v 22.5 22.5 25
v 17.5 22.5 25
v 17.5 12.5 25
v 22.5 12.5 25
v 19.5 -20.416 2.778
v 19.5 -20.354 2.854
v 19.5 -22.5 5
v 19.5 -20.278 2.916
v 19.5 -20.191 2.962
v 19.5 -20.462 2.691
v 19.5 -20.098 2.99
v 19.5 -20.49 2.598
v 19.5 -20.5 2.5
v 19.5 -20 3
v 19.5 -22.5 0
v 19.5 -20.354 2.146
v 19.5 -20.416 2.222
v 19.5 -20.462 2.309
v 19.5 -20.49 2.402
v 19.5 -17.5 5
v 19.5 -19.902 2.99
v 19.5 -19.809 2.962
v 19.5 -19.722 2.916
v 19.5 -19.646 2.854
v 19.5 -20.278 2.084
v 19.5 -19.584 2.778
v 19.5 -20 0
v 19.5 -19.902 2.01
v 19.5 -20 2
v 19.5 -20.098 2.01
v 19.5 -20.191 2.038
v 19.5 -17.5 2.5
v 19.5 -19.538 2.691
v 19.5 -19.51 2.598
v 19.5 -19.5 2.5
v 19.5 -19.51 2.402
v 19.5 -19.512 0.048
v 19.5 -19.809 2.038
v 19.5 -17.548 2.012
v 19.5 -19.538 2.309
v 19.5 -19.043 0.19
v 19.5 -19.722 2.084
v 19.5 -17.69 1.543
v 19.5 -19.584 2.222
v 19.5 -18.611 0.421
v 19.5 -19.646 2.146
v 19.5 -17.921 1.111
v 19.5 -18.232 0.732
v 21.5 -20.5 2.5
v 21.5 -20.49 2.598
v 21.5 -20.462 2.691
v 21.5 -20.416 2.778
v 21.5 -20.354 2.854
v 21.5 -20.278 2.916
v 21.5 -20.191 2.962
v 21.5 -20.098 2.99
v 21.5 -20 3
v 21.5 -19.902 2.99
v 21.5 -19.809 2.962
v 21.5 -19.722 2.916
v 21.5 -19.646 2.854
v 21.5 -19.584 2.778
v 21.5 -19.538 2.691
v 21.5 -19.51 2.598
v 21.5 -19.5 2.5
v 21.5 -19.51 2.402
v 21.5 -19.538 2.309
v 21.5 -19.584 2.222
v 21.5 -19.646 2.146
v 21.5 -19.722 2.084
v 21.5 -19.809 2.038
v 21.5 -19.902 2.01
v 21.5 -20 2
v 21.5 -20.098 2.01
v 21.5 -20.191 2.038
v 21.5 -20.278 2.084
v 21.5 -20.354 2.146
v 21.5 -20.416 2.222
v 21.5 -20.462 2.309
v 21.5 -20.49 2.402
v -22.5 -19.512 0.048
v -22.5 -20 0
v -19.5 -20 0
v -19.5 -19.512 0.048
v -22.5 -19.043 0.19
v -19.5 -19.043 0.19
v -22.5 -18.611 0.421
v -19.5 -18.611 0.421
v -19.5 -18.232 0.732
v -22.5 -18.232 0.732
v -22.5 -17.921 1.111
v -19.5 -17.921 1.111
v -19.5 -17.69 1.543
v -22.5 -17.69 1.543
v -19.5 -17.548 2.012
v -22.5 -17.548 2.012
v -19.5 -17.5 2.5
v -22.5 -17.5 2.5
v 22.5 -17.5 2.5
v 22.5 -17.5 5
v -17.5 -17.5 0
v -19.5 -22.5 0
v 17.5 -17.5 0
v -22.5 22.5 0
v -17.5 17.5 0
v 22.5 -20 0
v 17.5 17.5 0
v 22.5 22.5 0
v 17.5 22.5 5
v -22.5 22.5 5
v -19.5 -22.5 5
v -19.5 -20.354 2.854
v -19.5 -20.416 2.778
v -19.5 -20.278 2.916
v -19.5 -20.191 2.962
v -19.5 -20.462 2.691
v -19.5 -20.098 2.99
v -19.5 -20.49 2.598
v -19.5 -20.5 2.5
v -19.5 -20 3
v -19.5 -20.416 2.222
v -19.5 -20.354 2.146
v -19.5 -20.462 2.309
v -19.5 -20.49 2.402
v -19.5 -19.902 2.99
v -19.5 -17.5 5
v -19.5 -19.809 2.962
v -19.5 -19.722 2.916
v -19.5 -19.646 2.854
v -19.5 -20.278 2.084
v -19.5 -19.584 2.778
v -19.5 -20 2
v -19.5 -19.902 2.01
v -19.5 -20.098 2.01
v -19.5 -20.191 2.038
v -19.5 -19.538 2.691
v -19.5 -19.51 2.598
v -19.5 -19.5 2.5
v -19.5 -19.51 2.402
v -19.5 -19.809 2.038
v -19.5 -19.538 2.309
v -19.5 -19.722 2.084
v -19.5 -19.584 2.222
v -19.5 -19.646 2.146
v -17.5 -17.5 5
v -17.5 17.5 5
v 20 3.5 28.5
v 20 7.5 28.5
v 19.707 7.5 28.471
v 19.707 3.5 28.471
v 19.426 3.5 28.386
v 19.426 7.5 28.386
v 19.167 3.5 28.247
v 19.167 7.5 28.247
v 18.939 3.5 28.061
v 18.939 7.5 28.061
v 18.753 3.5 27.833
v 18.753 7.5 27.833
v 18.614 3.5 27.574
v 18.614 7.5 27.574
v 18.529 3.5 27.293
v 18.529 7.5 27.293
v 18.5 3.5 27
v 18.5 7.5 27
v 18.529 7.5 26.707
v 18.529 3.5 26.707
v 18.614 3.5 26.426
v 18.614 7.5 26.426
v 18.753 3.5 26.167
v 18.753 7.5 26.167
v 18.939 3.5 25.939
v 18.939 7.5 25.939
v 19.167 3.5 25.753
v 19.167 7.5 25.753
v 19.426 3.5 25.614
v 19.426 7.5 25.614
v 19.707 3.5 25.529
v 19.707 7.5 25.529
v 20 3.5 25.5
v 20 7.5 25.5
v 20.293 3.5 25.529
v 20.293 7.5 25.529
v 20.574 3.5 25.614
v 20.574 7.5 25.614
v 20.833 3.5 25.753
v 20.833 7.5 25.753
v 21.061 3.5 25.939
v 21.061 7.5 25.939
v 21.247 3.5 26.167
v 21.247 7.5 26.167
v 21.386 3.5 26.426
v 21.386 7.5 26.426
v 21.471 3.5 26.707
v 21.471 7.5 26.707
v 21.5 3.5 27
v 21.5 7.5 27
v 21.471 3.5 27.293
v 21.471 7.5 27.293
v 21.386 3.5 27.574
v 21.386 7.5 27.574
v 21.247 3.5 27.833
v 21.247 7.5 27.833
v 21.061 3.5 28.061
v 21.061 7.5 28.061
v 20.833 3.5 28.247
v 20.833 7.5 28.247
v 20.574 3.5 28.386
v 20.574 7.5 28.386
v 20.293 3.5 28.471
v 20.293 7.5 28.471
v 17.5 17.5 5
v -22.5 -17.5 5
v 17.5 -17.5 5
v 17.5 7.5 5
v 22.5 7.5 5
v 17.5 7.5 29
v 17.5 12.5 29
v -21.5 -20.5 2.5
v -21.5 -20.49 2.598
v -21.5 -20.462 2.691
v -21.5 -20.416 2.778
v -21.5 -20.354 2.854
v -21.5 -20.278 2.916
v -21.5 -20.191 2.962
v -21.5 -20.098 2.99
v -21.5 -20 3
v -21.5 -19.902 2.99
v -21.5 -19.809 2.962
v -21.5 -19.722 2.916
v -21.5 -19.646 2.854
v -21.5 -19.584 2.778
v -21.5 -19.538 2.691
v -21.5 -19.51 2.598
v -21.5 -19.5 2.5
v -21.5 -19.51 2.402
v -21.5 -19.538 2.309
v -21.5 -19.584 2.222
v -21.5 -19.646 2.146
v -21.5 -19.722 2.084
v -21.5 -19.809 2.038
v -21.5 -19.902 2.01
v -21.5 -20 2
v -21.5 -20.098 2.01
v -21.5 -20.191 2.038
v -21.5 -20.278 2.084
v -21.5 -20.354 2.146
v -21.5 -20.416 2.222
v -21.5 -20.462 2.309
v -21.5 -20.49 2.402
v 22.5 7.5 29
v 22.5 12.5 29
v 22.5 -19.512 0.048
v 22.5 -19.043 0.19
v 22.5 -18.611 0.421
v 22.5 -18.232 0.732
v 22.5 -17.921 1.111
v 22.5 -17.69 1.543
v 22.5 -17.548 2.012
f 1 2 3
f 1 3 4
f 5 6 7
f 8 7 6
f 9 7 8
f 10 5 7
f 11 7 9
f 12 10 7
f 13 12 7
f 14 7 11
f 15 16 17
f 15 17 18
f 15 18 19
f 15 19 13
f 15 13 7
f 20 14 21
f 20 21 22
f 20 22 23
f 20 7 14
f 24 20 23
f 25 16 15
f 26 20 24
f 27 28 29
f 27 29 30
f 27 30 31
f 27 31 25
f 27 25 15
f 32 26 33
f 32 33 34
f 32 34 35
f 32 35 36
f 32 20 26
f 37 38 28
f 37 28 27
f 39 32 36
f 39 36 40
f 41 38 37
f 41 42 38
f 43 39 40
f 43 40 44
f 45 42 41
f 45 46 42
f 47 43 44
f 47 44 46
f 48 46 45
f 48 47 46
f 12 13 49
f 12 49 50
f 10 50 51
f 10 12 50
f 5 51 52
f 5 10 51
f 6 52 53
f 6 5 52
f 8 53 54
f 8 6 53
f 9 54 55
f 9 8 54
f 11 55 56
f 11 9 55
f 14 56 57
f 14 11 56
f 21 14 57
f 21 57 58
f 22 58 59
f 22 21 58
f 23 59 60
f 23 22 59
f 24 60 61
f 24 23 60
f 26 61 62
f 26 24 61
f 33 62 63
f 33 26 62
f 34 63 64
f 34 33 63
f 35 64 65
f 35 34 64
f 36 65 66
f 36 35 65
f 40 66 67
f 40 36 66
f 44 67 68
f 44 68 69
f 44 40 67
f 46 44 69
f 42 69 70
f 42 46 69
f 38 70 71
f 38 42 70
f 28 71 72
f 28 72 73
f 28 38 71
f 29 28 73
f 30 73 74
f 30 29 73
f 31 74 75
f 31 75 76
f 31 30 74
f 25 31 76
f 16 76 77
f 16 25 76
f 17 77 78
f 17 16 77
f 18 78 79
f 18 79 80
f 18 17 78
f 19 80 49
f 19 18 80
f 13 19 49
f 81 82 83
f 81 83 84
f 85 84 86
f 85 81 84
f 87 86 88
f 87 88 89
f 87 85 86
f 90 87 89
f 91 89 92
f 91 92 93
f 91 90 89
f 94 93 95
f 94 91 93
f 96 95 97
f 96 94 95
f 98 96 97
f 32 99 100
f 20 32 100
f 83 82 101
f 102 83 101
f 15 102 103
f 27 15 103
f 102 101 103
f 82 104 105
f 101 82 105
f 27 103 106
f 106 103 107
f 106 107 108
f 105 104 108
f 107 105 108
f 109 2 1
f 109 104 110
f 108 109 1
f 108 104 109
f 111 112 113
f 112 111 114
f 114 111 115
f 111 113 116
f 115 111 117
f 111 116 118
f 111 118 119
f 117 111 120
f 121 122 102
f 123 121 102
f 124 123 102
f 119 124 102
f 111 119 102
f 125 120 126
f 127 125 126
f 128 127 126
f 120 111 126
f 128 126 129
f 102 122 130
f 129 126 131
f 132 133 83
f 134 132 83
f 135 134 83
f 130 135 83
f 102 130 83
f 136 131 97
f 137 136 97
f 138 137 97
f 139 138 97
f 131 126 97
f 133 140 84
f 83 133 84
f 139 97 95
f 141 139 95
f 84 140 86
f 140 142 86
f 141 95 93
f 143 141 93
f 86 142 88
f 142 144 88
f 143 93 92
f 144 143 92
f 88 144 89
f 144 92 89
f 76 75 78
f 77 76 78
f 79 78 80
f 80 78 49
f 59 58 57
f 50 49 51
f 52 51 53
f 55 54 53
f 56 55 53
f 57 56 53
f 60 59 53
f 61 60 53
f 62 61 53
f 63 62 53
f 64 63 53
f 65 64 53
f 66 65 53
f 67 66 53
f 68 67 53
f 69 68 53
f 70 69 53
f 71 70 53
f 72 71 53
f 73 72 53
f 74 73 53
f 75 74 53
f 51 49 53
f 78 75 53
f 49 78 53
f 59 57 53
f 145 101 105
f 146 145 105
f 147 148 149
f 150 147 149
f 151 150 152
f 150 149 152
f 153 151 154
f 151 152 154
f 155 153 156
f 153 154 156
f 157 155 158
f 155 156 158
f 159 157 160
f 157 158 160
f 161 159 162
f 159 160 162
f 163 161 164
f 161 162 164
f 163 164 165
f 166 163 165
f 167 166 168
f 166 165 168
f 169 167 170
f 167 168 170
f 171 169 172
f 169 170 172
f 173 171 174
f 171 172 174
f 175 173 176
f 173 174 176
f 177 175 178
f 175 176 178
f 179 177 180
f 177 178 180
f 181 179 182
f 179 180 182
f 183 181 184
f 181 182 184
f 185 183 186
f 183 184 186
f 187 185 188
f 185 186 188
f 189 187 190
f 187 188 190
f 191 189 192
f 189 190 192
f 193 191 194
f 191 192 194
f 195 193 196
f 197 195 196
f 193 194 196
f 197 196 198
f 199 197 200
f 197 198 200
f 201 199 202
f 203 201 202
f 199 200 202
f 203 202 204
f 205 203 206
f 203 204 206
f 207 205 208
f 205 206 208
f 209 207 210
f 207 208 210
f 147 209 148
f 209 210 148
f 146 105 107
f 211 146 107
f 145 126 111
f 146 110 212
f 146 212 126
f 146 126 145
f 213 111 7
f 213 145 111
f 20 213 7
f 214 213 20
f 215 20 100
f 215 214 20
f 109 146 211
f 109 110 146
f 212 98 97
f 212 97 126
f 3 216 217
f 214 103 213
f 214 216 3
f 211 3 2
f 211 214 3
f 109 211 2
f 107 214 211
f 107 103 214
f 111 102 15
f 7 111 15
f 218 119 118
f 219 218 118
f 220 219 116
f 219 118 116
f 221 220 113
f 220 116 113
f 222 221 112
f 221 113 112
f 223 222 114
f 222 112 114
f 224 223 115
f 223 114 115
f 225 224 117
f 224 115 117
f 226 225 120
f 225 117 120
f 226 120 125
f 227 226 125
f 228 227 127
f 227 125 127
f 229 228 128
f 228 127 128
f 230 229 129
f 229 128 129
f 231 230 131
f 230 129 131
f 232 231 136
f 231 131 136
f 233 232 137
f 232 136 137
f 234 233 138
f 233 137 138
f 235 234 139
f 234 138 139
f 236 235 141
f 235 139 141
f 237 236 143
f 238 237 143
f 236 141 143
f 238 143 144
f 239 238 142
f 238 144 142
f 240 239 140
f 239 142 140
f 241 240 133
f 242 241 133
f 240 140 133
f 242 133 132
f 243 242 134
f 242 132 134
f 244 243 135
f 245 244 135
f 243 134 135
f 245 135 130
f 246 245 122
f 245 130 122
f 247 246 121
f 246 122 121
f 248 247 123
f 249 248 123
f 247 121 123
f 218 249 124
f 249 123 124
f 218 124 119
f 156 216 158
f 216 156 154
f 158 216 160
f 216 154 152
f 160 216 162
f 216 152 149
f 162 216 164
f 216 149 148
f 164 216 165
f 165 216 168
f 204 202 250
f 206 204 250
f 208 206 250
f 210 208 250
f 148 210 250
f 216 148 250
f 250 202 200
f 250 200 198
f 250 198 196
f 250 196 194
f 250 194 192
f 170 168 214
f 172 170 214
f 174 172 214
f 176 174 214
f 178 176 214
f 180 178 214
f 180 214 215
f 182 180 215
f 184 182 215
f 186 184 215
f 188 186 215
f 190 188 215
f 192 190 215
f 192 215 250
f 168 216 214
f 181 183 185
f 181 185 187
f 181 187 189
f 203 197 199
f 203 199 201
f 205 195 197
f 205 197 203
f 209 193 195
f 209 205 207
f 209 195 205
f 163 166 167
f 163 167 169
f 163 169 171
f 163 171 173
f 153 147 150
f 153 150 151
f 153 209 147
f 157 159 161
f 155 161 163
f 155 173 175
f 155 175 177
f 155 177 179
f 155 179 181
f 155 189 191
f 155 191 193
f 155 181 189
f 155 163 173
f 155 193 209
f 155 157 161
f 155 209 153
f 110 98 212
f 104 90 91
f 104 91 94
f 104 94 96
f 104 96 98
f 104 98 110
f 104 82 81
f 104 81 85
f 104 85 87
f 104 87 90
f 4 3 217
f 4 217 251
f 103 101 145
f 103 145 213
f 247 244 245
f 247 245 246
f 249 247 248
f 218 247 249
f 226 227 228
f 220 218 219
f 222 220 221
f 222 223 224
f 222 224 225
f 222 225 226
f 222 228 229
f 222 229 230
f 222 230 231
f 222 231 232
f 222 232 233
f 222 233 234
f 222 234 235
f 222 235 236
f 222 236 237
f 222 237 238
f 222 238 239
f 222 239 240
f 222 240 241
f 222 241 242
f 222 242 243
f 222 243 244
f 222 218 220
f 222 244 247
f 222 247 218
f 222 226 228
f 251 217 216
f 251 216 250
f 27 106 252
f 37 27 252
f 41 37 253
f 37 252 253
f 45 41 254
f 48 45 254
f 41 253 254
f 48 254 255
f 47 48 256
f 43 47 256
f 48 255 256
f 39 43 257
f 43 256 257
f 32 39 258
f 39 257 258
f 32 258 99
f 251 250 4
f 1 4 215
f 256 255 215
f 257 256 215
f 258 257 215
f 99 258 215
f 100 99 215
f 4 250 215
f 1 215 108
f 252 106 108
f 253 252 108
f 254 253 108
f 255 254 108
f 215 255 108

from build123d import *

# Parameters (mm, degrees)
SKETCH_1_W          = 45
SKETCH_1_H          = 45
SKETCH_1_W_2        = 35
SKETCH_1_H_2        = 35
EXTRUDE_1_DEPTH     = 5
CUT_EXTRUDE_1_DEPTH = 3
SKETCH_3_R          = 0.5
EXTRUDE_2_DEPTH     = 2
SKETCH_4_W          = 5
SKETCH_4_H          = 15
EXTRUDE_3_DEPTH     = 20
SKETCH_5_W          = 5
SKETCH_5_H          = 5
EXTRUDE_4_DEPTH     = 4
SKETCH_6_R          = 1.5
EXTRUDE_5_DEPTH     = 4


with BuildPart() as part:
    # 草圖1 → 填料-伸長1 (new body)
    with BuildSketch(Plane.XY):
        Rectangle(SKETCH_1_W, SKETCH_1_H)
        Rectangle(SKETCH_1_W_2, SKETCH_1_H_2, mode=Mode.SUBTRACT)
    extrude(amount=EXTRUDE_1_DEPTH)

    # 草圖2 → 除料-伸長1 (cut)
    with BuildSketch(Plane.ZY.offset(22.5)):
        with BuildLine():
            Line((2.5, -17.5), (5, -17.5))
            Line((5, -17.5), (5, -22.5))
            Line((5, -22.5), (0, -22.5))
            Line((0, -22.5), (0, -20))
            ThreePointArc((0, -20), (0.732233047, -18.232233047), (2.5, -17.5))
        make_face()
    cut_extrude_1 = extrude(amount=-CUT_EXTRUDE_1_DEPTH, mode=Mode.SUBTRACT)

    # 鏡射1: 除料-伸長1 across plane
    add(cut_extrude_1.mirror(Plane(origin=(0, 0, 0), x_dir=(0, 0, 1), z_dir=(1, 0, 0))), mode=Mode.SUBTRACT)

    # 草圖3 → 填料-伸長2 (add)
    with BuildSketch(Plane.ZY.offset(19.5)):
        with Locations(Location((2.5, -20, 0), (0, 0, 270))):
            Circle(SKETCH_3_R)
    extrude_2 = extrude(amount=EXTRUDE_2_DEPTH)

    # 鏡射2: 填料-伸長2 across plane
    add(extrude_2.mirror(Plane(origin=(0, 0, 0), x_dir=(0, 0, 1), z_dir=(1, 0, 0))))

    # 草圖4 → 填料-伸長3 (add)
    with BuildSketch(Plane.XY.offset(5)):
        with Locations((20, 15)):
            Rectangle(SKETCH_4_W, SKETCH_4_H)
    extrude(amount=EXTRUDE_3_DEPTH)

    # 草圖5 → 填料-伸長4 (add)
    with BuildSketch(Plane.XY.offset(25)):
        with Locations((20, 10)):
            Rectangle(SKETCH_5_W, SKETCH_5_H)
    extrude(amount=EXTRUDE_4_DEPTH)

    # 草圖6 → 填料-伸長5 (add)
    with BuildSketch(Plane.XZ.offset(-7.5)):
        with Locations(Location((20, 27, 0), (0, 0, 90))):
            Circle(SKETCH_6_R)
    extrude(amount=EXTRUDE_5_DEPTH)


solid = part.part
